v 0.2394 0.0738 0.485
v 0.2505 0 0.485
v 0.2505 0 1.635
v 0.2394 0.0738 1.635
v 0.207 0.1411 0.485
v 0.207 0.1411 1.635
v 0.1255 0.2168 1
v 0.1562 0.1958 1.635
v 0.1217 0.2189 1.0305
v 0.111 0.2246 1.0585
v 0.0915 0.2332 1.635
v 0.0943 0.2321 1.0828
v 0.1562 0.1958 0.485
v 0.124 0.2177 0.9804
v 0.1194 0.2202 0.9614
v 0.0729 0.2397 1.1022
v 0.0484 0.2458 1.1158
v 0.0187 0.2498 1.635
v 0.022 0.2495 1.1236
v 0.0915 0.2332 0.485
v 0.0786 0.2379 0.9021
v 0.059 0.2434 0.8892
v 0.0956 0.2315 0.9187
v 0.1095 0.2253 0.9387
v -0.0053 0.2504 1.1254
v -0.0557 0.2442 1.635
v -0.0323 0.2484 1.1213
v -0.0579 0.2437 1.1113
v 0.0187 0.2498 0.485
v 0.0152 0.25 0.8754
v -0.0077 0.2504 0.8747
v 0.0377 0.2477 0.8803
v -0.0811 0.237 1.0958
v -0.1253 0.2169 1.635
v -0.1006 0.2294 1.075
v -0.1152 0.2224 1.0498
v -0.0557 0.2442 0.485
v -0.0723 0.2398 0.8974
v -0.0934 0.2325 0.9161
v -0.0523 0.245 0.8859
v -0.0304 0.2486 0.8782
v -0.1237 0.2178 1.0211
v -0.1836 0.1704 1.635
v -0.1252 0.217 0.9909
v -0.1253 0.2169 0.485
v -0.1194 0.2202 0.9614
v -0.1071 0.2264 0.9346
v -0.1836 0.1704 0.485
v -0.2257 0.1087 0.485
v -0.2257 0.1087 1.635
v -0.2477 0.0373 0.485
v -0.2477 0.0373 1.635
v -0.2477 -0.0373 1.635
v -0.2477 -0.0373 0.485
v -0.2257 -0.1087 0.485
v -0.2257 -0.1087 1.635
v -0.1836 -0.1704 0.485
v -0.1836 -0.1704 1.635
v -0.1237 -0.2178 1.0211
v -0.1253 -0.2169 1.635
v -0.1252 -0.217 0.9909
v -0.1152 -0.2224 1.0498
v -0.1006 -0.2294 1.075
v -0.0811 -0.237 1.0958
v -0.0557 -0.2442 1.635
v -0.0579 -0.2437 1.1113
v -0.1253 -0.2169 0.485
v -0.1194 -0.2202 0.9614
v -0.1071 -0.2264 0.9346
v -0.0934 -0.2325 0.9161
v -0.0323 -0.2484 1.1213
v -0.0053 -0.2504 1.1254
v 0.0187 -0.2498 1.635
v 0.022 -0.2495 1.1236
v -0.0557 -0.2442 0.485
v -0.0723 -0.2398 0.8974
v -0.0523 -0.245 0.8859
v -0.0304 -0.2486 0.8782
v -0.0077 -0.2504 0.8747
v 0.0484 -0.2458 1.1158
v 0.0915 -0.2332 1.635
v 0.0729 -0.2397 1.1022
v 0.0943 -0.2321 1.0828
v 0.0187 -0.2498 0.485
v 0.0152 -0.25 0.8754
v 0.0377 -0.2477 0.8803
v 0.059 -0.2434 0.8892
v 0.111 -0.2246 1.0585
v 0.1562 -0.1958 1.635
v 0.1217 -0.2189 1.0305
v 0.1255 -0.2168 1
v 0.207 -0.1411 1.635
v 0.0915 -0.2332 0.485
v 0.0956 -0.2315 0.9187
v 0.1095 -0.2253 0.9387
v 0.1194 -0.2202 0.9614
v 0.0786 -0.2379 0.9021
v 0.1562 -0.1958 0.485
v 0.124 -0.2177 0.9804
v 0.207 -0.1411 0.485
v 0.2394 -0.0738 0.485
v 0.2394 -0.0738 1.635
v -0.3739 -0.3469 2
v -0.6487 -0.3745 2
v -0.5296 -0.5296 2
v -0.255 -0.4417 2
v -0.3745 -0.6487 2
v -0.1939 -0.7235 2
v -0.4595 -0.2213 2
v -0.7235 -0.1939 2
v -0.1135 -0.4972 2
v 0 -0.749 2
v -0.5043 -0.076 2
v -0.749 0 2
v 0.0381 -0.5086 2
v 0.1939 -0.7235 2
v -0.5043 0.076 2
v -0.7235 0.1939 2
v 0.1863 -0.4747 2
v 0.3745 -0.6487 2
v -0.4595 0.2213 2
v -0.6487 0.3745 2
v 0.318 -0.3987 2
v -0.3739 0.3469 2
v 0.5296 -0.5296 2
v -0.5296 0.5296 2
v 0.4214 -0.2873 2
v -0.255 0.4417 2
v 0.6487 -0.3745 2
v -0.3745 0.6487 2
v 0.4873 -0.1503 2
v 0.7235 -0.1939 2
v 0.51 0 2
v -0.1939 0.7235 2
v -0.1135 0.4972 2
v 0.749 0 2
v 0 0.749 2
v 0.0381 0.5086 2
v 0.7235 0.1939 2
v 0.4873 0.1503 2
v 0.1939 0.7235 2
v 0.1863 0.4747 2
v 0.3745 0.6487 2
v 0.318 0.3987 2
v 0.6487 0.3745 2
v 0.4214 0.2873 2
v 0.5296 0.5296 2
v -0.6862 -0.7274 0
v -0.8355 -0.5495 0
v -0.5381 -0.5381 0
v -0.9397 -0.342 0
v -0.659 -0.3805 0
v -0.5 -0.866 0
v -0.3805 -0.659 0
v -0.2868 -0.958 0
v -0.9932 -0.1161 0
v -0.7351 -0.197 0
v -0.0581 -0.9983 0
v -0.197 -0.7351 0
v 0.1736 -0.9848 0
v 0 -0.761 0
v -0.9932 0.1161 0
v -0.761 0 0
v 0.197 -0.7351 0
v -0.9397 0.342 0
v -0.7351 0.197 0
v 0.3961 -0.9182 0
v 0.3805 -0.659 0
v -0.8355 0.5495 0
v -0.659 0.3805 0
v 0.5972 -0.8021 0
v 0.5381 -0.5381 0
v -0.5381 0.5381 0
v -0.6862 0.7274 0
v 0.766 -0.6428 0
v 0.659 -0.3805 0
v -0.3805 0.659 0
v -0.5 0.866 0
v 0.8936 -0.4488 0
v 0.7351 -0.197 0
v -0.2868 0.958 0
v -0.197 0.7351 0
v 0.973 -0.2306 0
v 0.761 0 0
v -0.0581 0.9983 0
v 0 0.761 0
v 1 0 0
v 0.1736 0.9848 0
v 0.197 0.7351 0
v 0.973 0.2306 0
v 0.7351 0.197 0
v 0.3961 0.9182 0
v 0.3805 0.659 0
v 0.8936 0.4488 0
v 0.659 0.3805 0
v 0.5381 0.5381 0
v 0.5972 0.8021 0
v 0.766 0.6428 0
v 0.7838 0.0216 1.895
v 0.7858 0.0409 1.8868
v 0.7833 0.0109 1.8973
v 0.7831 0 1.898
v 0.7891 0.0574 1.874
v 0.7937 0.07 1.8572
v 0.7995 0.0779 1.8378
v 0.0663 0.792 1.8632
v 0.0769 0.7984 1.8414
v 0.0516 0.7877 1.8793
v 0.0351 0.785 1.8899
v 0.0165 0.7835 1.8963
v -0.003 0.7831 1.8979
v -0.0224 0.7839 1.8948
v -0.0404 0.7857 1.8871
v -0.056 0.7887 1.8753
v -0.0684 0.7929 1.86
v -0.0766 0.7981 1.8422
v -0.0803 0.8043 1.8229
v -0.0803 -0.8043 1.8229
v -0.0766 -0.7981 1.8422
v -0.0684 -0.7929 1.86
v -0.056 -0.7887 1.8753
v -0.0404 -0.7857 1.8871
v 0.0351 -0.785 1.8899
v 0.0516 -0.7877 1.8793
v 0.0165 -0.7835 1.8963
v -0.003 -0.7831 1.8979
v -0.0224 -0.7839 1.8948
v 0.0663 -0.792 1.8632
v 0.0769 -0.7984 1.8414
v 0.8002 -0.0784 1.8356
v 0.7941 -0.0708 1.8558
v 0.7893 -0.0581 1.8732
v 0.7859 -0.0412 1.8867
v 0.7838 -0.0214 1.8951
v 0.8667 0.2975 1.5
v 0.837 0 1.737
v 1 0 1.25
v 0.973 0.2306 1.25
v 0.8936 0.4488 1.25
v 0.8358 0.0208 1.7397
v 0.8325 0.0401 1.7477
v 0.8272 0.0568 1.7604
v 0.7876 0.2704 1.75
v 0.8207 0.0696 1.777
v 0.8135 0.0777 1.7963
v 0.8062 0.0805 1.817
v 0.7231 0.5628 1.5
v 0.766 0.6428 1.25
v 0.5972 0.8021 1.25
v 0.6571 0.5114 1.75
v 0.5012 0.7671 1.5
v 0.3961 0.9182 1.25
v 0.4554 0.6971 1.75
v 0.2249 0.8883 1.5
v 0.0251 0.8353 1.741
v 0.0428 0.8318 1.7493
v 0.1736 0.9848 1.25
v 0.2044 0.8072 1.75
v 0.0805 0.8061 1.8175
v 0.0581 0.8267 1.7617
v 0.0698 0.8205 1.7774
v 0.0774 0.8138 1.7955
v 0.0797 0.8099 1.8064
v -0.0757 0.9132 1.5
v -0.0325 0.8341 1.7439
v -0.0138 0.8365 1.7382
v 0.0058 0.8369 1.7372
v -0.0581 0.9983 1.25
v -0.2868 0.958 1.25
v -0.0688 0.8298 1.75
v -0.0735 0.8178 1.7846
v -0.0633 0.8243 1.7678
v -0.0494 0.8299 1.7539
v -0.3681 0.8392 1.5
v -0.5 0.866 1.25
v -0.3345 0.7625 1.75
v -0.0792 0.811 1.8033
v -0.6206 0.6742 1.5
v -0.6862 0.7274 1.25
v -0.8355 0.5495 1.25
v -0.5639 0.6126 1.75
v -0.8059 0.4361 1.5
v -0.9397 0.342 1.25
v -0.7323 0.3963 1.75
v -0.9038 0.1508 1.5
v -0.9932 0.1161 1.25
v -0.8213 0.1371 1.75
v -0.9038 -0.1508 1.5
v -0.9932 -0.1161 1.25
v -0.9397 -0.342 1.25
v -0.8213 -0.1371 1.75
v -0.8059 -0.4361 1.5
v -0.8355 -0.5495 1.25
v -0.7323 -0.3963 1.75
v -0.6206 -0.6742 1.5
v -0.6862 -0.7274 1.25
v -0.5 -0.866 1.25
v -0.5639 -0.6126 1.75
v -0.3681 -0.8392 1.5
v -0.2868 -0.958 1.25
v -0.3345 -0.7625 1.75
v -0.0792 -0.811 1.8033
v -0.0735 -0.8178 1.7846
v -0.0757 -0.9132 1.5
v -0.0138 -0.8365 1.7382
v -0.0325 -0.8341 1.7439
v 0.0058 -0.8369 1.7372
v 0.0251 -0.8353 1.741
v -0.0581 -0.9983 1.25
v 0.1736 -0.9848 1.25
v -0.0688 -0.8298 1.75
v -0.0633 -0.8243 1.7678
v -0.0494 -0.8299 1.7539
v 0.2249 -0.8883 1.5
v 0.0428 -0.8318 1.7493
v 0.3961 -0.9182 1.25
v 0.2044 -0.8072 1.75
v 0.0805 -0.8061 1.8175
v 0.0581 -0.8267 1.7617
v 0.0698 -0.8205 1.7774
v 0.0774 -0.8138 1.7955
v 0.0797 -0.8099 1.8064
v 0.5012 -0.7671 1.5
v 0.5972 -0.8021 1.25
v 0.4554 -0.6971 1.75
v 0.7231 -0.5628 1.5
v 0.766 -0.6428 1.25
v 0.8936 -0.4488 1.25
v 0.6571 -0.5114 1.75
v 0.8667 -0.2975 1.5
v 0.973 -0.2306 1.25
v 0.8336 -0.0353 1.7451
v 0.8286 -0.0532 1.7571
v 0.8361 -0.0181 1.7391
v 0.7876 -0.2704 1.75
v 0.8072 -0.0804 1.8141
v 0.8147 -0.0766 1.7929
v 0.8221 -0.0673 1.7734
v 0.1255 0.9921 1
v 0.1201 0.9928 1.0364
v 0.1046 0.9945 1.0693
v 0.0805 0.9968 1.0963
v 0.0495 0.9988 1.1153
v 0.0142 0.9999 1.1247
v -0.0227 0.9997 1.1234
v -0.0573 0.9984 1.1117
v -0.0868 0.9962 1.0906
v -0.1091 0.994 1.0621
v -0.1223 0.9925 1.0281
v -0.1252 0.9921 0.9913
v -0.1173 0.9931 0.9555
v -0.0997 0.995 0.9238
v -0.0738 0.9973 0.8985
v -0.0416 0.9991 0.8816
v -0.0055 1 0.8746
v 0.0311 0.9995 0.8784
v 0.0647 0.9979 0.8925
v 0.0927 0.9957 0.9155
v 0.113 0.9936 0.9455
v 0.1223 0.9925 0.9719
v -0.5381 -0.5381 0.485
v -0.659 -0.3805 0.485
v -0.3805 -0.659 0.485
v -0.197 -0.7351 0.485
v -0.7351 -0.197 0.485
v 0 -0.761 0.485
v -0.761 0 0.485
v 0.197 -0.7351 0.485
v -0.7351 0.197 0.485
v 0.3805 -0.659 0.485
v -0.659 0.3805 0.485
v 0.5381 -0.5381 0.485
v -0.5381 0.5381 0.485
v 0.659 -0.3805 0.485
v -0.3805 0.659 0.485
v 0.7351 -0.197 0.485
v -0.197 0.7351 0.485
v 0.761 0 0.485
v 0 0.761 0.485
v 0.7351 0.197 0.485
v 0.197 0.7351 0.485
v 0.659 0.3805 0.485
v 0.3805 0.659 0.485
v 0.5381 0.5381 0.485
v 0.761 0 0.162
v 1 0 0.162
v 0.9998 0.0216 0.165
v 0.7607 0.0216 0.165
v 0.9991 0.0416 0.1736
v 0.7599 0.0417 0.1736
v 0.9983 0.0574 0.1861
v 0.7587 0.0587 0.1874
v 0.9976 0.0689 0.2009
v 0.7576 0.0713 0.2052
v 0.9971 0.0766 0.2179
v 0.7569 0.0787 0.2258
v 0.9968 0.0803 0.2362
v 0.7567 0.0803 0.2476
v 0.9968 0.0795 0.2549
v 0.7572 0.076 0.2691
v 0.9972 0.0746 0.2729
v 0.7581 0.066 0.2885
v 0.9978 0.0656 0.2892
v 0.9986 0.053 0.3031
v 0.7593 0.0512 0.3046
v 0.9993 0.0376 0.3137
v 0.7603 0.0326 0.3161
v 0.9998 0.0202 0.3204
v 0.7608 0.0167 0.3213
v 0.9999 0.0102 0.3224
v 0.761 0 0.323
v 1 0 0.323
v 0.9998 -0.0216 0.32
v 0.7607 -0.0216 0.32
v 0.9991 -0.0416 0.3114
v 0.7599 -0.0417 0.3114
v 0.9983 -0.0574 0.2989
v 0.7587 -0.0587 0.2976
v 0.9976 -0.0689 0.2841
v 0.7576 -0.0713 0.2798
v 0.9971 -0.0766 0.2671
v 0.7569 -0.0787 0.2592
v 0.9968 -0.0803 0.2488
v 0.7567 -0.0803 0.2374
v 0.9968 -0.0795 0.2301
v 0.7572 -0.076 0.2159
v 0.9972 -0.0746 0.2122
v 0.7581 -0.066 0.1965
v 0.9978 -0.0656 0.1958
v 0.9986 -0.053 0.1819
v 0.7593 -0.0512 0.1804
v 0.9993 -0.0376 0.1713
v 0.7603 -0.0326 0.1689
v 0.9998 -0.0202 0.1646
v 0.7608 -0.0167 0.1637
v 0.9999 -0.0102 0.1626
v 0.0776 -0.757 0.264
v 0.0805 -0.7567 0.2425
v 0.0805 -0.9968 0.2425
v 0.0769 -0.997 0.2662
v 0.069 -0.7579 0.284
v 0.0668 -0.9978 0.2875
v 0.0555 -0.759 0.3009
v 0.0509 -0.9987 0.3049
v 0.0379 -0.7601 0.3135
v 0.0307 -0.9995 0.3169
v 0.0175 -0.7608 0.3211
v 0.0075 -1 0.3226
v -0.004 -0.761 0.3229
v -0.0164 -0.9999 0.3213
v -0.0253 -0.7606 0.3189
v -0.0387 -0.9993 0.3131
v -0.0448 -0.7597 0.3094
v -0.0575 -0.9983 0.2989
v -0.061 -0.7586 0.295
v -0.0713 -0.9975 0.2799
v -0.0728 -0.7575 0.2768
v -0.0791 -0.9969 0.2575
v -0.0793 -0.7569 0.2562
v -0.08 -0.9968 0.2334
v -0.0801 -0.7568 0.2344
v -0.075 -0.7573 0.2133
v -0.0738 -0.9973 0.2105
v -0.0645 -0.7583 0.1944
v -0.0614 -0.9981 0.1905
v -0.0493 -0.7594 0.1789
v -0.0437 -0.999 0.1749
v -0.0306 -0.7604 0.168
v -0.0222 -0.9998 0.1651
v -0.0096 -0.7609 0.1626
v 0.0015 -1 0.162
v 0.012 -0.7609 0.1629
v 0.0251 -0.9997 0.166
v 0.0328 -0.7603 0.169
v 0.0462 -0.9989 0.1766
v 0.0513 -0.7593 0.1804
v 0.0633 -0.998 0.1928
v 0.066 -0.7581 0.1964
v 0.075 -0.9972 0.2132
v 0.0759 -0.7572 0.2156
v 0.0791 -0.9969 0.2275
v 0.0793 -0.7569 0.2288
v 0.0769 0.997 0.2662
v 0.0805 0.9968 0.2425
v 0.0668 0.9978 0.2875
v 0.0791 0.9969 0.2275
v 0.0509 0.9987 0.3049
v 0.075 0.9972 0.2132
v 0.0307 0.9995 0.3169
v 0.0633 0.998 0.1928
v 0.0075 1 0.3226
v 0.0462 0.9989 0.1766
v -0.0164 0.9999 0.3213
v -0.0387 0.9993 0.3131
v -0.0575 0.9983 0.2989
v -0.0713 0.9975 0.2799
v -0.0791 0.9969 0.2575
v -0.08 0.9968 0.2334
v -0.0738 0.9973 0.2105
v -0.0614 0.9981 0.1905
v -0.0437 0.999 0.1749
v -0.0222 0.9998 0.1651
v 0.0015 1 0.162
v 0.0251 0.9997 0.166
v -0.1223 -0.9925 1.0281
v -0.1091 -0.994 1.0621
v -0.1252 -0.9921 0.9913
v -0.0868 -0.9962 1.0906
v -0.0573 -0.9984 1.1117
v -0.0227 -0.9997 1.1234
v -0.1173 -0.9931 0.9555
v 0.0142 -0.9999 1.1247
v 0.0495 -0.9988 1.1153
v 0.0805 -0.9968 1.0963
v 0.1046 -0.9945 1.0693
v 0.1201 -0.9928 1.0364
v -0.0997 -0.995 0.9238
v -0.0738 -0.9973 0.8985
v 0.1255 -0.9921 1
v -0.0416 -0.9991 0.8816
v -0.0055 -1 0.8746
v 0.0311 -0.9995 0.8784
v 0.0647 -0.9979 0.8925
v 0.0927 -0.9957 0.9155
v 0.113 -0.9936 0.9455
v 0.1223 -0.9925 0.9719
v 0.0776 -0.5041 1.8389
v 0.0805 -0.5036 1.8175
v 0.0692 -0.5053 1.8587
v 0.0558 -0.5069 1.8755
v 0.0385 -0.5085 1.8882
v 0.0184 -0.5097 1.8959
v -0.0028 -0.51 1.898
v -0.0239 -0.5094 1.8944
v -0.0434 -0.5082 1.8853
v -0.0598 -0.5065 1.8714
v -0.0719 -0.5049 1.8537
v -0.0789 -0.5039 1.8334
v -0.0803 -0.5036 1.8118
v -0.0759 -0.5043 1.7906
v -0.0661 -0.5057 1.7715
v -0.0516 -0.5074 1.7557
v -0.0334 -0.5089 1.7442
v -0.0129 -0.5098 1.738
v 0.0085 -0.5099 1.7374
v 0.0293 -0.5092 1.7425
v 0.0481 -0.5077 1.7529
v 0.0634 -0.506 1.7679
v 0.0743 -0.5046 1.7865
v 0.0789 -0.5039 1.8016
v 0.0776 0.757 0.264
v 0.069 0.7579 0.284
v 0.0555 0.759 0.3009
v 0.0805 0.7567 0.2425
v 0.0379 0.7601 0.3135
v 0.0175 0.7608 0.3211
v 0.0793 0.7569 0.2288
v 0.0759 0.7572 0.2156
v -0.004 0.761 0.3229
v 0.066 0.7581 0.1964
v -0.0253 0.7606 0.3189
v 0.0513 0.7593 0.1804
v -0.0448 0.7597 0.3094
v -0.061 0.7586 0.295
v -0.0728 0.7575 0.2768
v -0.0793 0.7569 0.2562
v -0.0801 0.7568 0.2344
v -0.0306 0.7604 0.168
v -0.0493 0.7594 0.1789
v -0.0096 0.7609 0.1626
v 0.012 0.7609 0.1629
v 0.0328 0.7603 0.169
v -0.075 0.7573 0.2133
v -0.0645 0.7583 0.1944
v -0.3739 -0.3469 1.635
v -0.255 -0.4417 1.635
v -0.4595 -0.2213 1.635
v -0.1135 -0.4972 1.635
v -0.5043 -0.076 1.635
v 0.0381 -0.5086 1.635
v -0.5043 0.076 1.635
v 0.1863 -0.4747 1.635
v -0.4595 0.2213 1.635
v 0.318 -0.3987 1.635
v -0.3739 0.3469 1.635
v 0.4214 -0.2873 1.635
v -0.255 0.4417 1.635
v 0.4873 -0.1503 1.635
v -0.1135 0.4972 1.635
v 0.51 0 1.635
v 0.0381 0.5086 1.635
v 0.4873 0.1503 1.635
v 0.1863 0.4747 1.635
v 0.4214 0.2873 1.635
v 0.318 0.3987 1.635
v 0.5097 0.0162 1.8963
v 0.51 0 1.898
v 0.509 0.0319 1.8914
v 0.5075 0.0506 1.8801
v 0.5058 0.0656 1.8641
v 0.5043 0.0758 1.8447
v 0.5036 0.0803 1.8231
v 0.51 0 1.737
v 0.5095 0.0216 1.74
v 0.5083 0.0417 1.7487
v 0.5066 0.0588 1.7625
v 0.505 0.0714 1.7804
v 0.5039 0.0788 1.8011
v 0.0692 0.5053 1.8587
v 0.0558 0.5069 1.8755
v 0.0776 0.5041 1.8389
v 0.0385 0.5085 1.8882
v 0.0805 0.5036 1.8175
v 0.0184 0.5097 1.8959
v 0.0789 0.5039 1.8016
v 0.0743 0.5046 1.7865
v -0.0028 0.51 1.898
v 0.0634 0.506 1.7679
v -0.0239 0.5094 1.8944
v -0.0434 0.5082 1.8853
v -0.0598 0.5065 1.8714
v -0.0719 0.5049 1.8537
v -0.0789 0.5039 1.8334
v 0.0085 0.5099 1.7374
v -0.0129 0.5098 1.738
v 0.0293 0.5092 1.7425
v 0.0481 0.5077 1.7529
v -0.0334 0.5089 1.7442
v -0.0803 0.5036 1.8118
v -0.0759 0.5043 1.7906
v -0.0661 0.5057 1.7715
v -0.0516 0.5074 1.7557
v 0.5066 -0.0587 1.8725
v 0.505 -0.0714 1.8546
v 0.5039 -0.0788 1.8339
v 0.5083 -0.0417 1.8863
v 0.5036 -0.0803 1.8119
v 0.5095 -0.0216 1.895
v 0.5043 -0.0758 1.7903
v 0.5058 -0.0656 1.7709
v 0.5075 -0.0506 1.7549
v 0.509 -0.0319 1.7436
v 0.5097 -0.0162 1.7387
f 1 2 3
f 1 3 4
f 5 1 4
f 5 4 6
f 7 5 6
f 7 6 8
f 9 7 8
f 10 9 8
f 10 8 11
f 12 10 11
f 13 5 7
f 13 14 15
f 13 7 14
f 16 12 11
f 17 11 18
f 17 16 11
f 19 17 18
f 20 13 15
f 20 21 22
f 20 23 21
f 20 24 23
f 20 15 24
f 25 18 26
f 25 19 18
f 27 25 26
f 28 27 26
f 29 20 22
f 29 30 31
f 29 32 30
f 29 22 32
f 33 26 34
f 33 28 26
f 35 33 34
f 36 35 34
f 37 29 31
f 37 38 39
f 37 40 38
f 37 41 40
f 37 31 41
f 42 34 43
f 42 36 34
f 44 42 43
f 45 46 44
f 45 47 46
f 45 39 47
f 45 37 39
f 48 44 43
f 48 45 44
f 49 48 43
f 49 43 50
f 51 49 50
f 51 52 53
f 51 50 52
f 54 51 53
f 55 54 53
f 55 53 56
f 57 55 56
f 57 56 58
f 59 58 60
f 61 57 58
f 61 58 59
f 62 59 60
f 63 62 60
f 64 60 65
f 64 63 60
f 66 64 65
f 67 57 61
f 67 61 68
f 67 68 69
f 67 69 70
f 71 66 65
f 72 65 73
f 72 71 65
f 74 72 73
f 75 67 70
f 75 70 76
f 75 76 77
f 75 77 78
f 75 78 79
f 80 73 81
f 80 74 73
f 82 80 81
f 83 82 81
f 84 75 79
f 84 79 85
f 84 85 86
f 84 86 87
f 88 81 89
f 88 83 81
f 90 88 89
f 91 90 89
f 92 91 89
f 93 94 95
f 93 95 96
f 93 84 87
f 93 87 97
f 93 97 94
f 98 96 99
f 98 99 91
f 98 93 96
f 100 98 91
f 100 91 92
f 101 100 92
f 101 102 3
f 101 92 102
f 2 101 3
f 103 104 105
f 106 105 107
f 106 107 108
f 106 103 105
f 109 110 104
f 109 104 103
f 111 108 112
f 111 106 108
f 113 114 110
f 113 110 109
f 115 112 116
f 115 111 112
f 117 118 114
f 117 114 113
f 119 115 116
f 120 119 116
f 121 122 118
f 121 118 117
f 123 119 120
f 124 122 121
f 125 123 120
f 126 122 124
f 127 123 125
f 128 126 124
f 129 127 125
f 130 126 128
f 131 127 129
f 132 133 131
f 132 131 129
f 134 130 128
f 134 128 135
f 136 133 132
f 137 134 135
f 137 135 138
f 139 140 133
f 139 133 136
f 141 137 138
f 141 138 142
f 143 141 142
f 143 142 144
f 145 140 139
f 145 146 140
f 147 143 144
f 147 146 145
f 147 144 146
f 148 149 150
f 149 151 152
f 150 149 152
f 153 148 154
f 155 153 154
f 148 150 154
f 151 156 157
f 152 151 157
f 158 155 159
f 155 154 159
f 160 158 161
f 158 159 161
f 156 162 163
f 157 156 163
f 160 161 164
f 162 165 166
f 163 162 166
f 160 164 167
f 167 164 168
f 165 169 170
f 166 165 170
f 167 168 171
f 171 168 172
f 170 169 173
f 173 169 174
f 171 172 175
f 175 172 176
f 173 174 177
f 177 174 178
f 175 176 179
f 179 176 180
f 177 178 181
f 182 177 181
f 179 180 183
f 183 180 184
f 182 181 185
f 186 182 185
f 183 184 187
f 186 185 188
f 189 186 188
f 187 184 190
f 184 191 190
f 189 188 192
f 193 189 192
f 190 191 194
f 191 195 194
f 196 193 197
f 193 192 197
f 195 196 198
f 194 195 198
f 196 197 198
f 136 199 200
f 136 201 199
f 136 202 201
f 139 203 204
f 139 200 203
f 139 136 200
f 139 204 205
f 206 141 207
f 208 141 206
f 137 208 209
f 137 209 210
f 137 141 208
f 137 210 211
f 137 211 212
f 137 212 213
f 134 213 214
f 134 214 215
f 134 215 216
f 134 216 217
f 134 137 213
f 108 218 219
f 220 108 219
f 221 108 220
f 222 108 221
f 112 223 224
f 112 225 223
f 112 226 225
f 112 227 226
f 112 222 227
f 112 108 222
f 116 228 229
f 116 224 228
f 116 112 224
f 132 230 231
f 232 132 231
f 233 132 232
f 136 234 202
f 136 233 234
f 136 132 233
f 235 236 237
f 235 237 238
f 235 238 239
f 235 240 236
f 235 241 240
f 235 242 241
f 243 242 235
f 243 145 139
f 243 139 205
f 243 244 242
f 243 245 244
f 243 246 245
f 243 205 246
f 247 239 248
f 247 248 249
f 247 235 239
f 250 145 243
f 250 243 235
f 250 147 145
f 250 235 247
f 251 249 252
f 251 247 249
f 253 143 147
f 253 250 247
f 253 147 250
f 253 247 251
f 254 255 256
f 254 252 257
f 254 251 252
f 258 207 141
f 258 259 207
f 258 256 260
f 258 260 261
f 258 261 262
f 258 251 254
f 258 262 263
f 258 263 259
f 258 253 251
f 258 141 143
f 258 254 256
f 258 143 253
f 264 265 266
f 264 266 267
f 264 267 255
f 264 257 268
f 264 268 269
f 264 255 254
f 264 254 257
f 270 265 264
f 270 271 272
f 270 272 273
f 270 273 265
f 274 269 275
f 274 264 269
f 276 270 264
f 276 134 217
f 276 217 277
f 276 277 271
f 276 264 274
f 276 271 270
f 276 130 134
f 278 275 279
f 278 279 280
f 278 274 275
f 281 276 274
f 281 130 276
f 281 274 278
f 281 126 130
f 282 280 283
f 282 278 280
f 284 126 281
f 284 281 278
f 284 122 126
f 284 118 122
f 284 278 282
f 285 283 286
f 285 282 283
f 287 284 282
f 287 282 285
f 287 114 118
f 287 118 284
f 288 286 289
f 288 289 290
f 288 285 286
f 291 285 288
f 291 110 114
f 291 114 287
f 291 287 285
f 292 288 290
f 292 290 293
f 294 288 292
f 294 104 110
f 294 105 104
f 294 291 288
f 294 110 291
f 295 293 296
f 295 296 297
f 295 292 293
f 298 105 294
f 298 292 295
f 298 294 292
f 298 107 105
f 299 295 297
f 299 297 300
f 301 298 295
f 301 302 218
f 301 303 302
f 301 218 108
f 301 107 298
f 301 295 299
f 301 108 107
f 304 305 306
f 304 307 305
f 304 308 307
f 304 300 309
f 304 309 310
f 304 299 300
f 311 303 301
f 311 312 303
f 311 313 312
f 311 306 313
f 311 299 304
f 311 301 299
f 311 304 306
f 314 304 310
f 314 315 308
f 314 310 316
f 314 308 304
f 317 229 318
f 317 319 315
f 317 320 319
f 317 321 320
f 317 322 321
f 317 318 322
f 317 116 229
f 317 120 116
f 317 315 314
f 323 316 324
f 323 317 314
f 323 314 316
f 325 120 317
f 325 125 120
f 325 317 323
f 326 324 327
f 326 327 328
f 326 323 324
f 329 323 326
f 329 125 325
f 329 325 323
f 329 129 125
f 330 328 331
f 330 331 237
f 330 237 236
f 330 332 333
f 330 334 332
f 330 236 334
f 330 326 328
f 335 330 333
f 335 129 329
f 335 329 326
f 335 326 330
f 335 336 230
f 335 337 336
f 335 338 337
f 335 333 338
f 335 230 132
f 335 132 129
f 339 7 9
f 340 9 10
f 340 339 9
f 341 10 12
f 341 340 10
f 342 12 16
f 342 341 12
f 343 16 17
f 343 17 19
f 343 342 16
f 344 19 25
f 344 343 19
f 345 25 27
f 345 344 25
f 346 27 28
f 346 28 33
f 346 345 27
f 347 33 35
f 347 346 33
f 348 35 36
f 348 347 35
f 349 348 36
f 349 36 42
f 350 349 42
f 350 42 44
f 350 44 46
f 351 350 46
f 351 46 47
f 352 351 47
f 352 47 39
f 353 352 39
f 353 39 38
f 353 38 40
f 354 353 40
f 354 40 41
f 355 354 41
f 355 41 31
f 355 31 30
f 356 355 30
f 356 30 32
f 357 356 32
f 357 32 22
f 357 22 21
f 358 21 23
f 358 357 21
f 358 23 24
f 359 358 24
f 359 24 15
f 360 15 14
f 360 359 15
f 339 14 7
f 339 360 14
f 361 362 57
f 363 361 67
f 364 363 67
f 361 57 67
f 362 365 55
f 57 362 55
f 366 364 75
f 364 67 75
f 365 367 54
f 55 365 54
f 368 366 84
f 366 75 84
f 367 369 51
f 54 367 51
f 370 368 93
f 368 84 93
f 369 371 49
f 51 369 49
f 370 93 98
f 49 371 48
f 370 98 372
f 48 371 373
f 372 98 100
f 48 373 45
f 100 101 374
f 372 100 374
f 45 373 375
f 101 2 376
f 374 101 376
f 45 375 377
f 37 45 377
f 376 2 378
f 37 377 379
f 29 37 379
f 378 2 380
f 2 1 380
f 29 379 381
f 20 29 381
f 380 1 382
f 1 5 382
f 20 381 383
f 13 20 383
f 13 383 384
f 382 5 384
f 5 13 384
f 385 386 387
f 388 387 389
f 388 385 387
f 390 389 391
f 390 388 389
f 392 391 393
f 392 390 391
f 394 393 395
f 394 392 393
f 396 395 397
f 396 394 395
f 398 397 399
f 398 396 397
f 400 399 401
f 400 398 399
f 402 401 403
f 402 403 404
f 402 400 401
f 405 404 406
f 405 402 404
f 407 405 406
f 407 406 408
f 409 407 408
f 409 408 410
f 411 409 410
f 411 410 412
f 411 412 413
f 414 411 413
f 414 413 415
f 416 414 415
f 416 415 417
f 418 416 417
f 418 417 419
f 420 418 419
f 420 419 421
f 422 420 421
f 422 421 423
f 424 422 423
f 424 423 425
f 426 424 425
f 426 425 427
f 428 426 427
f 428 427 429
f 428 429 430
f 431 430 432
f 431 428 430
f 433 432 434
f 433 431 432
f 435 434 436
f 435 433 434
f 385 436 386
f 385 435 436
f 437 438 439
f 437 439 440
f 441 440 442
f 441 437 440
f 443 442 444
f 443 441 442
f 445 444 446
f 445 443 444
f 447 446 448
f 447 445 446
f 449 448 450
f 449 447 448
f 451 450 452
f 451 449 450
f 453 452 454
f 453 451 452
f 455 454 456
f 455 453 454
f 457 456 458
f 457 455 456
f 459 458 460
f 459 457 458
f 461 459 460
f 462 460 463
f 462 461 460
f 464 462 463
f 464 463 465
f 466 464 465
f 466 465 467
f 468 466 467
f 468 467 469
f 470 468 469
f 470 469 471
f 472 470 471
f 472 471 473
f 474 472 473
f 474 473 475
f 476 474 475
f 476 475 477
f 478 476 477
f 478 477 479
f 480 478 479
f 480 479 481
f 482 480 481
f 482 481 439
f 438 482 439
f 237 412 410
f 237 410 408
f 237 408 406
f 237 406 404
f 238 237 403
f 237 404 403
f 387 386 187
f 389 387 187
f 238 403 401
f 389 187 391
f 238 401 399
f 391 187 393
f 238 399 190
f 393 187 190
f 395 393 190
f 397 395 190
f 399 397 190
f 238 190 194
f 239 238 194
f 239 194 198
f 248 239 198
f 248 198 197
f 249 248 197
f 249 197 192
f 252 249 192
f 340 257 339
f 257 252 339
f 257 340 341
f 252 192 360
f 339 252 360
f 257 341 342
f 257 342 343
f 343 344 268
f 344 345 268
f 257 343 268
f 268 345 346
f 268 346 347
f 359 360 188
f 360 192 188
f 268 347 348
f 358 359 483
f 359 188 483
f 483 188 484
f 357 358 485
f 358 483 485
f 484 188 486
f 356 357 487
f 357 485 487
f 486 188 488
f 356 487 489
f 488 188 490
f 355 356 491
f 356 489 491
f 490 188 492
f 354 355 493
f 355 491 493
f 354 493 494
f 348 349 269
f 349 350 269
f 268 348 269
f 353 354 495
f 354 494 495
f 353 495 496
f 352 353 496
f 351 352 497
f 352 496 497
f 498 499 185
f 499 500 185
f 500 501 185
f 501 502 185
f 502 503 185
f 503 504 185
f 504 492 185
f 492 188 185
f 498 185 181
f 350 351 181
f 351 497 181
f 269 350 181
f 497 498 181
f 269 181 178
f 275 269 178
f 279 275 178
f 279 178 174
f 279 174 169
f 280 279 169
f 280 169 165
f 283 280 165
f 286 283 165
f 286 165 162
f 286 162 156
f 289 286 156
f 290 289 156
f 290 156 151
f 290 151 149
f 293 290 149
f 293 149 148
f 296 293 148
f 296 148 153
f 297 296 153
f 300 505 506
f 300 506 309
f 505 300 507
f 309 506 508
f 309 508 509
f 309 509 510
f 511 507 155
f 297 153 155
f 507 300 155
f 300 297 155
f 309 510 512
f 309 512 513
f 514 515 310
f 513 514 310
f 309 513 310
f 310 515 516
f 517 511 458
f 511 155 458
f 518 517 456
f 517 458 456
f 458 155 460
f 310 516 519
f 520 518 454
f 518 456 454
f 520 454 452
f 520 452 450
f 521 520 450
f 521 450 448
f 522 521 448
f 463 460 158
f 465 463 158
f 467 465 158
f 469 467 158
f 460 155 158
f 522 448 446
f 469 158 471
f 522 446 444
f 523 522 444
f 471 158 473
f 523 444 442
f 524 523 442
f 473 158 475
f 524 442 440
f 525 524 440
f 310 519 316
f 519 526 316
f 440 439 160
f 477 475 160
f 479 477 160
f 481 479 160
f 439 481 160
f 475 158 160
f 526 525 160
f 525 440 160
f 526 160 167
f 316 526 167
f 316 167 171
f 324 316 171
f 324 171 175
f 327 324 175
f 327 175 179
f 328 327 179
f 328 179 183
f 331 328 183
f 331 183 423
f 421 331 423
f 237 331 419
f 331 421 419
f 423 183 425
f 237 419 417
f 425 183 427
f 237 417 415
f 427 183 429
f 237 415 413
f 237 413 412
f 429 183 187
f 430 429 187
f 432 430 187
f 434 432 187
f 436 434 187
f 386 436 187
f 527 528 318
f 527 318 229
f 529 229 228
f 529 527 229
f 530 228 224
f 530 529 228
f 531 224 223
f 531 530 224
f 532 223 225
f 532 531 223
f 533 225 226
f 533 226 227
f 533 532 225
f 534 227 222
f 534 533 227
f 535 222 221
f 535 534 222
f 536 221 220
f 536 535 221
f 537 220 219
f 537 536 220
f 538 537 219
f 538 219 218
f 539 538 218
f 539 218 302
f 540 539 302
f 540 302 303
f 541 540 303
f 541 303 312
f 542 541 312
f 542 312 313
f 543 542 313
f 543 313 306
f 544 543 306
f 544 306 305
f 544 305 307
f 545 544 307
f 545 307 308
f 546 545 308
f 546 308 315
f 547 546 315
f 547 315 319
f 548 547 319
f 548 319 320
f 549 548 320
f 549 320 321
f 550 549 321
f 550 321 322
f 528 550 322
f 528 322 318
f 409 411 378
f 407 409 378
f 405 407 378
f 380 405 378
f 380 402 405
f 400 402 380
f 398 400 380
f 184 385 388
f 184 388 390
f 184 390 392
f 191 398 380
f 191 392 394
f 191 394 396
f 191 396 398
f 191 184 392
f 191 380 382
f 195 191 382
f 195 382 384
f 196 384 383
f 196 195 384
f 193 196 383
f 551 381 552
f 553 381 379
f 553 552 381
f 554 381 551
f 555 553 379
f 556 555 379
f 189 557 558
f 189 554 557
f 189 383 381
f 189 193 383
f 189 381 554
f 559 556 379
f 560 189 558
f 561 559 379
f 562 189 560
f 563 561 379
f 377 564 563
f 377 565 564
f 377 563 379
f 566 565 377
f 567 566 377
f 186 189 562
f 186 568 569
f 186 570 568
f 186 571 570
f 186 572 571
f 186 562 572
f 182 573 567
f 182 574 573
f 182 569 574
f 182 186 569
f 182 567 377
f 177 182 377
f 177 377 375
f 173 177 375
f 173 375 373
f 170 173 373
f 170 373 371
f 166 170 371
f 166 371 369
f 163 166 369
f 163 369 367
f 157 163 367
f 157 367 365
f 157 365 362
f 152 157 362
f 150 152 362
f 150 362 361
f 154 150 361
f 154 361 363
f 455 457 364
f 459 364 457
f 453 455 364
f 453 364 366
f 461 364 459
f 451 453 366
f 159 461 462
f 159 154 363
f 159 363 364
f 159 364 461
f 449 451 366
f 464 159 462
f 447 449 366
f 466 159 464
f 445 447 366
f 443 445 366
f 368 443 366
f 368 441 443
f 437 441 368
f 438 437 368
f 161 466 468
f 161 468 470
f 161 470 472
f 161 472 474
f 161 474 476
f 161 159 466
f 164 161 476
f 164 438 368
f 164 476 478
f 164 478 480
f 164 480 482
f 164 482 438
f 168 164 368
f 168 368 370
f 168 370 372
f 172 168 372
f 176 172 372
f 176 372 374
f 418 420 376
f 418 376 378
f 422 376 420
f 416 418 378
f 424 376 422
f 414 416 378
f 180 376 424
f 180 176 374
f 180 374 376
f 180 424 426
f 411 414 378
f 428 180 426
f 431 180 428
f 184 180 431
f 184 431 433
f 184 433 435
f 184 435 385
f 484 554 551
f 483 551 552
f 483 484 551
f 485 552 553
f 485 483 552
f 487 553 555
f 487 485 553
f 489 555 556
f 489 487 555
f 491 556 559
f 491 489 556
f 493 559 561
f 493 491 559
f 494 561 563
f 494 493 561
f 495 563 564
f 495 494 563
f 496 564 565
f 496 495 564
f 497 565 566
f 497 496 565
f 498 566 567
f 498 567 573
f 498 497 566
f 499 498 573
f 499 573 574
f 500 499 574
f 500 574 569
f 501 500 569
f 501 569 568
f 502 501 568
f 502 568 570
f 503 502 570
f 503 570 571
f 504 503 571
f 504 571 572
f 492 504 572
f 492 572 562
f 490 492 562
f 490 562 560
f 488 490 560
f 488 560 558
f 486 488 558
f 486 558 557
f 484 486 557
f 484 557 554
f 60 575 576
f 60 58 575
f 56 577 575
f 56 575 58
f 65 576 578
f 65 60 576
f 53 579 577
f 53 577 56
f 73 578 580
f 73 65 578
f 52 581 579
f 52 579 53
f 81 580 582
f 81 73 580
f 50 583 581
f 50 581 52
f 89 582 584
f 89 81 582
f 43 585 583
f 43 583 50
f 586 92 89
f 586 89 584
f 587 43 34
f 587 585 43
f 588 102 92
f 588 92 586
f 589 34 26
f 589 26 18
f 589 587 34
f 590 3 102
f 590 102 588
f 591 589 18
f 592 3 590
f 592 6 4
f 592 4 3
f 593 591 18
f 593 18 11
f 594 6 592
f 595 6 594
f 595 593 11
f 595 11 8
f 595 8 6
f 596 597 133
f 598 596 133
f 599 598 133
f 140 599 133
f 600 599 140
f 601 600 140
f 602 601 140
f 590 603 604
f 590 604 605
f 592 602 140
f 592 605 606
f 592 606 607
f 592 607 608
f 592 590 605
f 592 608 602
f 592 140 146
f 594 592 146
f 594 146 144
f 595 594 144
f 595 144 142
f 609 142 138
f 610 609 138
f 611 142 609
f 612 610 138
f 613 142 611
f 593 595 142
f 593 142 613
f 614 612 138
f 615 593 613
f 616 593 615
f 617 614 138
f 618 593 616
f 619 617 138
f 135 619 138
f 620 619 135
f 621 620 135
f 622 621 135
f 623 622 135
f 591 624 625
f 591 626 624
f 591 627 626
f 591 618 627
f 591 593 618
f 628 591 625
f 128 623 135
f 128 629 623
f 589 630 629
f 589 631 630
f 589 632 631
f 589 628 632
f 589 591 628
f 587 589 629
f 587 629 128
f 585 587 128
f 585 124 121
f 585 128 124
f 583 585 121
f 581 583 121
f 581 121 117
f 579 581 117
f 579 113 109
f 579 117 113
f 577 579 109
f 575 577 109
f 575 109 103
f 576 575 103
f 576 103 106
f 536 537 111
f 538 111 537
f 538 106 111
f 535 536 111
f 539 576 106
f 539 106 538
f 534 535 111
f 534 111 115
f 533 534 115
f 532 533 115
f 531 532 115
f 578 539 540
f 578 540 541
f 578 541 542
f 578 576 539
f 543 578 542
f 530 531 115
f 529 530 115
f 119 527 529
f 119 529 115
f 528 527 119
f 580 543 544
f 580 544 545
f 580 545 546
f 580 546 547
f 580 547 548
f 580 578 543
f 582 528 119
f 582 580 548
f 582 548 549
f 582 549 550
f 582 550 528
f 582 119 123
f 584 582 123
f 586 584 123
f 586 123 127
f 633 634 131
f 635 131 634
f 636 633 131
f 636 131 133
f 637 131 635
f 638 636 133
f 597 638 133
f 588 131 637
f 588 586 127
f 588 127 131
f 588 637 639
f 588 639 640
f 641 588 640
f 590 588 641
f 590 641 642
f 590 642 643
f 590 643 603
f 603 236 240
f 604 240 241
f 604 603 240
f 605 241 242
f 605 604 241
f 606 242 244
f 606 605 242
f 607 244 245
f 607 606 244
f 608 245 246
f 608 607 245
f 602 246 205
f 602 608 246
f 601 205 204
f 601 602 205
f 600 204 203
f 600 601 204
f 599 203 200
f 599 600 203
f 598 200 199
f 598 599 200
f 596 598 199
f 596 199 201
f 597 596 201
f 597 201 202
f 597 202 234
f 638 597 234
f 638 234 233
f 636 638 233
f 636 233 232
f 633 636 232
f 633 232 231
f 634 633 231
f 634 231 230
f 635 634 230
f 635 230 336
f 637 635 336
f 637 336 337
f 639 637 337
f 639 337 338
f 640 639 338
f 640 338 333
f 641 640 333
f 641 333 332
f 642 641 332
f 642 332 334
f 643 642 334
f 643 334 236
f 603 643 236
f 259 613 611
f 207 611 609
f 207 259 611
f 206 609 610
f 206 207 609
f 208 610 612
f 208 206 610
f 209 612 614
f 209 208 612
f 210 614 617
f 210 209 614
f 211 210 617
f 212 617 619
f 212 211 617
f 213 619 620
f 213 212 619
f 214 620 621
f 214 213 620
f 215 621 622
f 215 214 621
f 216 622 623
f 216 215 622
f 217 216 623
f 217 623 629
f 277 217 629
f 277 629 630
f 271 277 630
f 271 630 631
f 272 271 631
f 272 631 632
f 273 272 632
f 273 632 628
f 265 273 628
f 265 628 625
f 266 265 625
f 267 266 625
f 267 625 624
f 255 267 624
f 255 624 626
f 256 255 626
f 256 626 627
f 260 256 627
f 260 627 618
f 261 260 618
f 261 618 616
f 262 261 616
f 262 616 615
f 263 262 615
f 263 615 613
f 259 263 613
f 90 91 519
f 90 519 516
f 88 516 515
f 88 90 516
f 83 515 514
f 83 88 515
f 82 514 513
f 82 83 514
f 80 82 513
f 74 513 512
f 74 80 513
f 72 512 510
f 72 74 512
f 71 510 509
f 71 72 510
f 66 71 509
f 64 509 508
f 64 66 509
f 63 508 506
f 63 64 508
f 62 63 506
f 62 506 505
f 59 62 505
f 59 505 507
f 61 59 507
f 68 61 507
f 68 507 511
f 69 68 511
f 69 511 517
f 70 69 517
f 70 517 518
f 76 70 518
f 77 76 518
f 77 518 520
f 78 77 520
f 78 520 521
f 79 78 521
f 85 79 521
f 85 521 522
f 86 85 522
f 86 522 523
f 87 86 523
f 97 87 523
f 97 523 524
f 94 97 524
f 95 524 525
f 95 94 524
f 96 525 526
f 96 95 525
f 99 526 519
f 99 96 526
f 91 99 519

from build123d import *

# Parameters (mm, degrees)
CYLINDER003_R     = 0.761
CYLINDER003_DEPTH = 0.585
CYLINDER004_R     = 0.51
CYLINDER004_DEPTH = 0.465
CYLINDER005_R     = 0.1255
CYLINDER005_DEPTH = 2.2
CYLINDER006_R     = 0.0805
CYLINDER006_DEPTH = 2.2
CYLINDER007_R     = 0.0805
CYLINDER007_DEPTH = 2.2
CYLINDER008_R     = 0.0805
CYLINDER008_DEPTH = 2.2
CYLINDER009_R     = 0.0805
CYLINDER009_DEPTH = 2.2
CYLINDER002_R     = 0.2505
CYLINDER002_DEPTH = 2.2
CYLINDER_R        = 1
CYLINDER_DEPTH    = 1.25


with BuildPart() as cylinder003:
    # cylinder003 → cylinder003 (new body)
    with BuildSketch(Plane.XY.offset(-0.1)):
        Circle(CYLINDER003_R)
    extrude(amount=CYLINDER003_DEPTH)


with BuildPart() as cylinder004:
    # cylinder004 → cylinder004 (new body)
    with BuildSketch(Plane.XY.offset(1.635)):
        Circle(CYLINDER004_R)
    extrude(amount=CYLINDER004_DEPTH)


with BuildPart() as cylinder005:
    # cylinder005 → cylinder005 (new body)
    with BuildSketch(Plane(origin=(0, 1.1, 1), x_dir=(1, 0, 0), z_dir=(0, -1, 0))):
        Circle(CYLINDER005_R)
    extrude(amount=CYLINDER005_DEPTH)


with BuildPart() as cylinder006:
    # cylinder006 → cylinder006 (new body)
    with BuildSketch(Plane(origin=(0, 1.1, 0.2425), x_dir=(1, 0, 0), z_dir=(0, -1, 0))):
        Circle(CYLINDER006_R)
    extrude(amount=CYLINDER006_DEPTH)


with BuildPart() as cylinder007:
    # cylinder007 → cylinder007 (new body)
    with BuildSketch(Plane(origin=(0, 0, 0.2425), x_dir=(0, 0, -1), z_dir=(1, 0, 0))):
        Circle(CYLINDER007_R)
    extrude(amount=CYLINDER007_DEPTH)


with BuildPart() as cylinder008:
    # cylinder008 → cylinder008 (new body)
    with BuildSketch(Plane(origin=(0, 1.1, 1.8175), x_dir=(1, 0, 0), z_dir=(0, -1, 0))):
        Circle(CYLINDER008_R)
    extrude(amount=CYLINDER008_DEPTH)


with BuildPart() as cylinder009:
    # cylinder009 → cylinder009 (new body)
    with BuildSketch(Plane(origin=(0, 0, 1.8175), x_dir=(0, 0, -1), z_dir=(1, 0, 0))):
        Circle(CYLINDER009_R)
    extrude(amount=CYLINDER009_DEPTH)


with BuildPart() as union001:
    # cylinder002 → cylinder002 (new body)
    with BuildSketch(Plane.XY.offset(-0.1)):
        Circle(CYLINDER002_R)
    extrude(amount=CYLINDER002_DEPTH)

    # union001: union cylinder003, cylinder004, cylinder005, cylinder006, cylinder007, cylinder008, cylinder009
    add(cylinder003.part)
    add(cylinder004.part)
    add(cylinder005.part)
    add(cylinder006.part)
    add(cylinder007.part)
    add(cylinder008.part)
    add(cylinder009.part)


with BuildPart() as cylinder001:
    # cylinder001 → cylinder001 (revolve)
    with BuildSketch(Plane(origin=(0, 0, 1.25), x_dir=(1, 0, 0), z_dir=(0, -1, 0))):
        Polygon((0, 0), (1, 0), (0.749, 0.75), (0, 0.75), align=None)
    revolve(axis=Axis((0, 0, 1.25), (0, 0, 1)))


with BuildPart() as difference:
    # cylinder → cylinder (new body)
    with BuildSketch(Plane.XY):
        Circle(CYLINDER_R)
    extrude(amount=CYLINDER_DEPTH)

    # union: union cylinder001
    add(cylinder001.part)

    # difference: cut union001
    add(union001.part, mode=Mode.SUBTRACT)


solid = difference.part
